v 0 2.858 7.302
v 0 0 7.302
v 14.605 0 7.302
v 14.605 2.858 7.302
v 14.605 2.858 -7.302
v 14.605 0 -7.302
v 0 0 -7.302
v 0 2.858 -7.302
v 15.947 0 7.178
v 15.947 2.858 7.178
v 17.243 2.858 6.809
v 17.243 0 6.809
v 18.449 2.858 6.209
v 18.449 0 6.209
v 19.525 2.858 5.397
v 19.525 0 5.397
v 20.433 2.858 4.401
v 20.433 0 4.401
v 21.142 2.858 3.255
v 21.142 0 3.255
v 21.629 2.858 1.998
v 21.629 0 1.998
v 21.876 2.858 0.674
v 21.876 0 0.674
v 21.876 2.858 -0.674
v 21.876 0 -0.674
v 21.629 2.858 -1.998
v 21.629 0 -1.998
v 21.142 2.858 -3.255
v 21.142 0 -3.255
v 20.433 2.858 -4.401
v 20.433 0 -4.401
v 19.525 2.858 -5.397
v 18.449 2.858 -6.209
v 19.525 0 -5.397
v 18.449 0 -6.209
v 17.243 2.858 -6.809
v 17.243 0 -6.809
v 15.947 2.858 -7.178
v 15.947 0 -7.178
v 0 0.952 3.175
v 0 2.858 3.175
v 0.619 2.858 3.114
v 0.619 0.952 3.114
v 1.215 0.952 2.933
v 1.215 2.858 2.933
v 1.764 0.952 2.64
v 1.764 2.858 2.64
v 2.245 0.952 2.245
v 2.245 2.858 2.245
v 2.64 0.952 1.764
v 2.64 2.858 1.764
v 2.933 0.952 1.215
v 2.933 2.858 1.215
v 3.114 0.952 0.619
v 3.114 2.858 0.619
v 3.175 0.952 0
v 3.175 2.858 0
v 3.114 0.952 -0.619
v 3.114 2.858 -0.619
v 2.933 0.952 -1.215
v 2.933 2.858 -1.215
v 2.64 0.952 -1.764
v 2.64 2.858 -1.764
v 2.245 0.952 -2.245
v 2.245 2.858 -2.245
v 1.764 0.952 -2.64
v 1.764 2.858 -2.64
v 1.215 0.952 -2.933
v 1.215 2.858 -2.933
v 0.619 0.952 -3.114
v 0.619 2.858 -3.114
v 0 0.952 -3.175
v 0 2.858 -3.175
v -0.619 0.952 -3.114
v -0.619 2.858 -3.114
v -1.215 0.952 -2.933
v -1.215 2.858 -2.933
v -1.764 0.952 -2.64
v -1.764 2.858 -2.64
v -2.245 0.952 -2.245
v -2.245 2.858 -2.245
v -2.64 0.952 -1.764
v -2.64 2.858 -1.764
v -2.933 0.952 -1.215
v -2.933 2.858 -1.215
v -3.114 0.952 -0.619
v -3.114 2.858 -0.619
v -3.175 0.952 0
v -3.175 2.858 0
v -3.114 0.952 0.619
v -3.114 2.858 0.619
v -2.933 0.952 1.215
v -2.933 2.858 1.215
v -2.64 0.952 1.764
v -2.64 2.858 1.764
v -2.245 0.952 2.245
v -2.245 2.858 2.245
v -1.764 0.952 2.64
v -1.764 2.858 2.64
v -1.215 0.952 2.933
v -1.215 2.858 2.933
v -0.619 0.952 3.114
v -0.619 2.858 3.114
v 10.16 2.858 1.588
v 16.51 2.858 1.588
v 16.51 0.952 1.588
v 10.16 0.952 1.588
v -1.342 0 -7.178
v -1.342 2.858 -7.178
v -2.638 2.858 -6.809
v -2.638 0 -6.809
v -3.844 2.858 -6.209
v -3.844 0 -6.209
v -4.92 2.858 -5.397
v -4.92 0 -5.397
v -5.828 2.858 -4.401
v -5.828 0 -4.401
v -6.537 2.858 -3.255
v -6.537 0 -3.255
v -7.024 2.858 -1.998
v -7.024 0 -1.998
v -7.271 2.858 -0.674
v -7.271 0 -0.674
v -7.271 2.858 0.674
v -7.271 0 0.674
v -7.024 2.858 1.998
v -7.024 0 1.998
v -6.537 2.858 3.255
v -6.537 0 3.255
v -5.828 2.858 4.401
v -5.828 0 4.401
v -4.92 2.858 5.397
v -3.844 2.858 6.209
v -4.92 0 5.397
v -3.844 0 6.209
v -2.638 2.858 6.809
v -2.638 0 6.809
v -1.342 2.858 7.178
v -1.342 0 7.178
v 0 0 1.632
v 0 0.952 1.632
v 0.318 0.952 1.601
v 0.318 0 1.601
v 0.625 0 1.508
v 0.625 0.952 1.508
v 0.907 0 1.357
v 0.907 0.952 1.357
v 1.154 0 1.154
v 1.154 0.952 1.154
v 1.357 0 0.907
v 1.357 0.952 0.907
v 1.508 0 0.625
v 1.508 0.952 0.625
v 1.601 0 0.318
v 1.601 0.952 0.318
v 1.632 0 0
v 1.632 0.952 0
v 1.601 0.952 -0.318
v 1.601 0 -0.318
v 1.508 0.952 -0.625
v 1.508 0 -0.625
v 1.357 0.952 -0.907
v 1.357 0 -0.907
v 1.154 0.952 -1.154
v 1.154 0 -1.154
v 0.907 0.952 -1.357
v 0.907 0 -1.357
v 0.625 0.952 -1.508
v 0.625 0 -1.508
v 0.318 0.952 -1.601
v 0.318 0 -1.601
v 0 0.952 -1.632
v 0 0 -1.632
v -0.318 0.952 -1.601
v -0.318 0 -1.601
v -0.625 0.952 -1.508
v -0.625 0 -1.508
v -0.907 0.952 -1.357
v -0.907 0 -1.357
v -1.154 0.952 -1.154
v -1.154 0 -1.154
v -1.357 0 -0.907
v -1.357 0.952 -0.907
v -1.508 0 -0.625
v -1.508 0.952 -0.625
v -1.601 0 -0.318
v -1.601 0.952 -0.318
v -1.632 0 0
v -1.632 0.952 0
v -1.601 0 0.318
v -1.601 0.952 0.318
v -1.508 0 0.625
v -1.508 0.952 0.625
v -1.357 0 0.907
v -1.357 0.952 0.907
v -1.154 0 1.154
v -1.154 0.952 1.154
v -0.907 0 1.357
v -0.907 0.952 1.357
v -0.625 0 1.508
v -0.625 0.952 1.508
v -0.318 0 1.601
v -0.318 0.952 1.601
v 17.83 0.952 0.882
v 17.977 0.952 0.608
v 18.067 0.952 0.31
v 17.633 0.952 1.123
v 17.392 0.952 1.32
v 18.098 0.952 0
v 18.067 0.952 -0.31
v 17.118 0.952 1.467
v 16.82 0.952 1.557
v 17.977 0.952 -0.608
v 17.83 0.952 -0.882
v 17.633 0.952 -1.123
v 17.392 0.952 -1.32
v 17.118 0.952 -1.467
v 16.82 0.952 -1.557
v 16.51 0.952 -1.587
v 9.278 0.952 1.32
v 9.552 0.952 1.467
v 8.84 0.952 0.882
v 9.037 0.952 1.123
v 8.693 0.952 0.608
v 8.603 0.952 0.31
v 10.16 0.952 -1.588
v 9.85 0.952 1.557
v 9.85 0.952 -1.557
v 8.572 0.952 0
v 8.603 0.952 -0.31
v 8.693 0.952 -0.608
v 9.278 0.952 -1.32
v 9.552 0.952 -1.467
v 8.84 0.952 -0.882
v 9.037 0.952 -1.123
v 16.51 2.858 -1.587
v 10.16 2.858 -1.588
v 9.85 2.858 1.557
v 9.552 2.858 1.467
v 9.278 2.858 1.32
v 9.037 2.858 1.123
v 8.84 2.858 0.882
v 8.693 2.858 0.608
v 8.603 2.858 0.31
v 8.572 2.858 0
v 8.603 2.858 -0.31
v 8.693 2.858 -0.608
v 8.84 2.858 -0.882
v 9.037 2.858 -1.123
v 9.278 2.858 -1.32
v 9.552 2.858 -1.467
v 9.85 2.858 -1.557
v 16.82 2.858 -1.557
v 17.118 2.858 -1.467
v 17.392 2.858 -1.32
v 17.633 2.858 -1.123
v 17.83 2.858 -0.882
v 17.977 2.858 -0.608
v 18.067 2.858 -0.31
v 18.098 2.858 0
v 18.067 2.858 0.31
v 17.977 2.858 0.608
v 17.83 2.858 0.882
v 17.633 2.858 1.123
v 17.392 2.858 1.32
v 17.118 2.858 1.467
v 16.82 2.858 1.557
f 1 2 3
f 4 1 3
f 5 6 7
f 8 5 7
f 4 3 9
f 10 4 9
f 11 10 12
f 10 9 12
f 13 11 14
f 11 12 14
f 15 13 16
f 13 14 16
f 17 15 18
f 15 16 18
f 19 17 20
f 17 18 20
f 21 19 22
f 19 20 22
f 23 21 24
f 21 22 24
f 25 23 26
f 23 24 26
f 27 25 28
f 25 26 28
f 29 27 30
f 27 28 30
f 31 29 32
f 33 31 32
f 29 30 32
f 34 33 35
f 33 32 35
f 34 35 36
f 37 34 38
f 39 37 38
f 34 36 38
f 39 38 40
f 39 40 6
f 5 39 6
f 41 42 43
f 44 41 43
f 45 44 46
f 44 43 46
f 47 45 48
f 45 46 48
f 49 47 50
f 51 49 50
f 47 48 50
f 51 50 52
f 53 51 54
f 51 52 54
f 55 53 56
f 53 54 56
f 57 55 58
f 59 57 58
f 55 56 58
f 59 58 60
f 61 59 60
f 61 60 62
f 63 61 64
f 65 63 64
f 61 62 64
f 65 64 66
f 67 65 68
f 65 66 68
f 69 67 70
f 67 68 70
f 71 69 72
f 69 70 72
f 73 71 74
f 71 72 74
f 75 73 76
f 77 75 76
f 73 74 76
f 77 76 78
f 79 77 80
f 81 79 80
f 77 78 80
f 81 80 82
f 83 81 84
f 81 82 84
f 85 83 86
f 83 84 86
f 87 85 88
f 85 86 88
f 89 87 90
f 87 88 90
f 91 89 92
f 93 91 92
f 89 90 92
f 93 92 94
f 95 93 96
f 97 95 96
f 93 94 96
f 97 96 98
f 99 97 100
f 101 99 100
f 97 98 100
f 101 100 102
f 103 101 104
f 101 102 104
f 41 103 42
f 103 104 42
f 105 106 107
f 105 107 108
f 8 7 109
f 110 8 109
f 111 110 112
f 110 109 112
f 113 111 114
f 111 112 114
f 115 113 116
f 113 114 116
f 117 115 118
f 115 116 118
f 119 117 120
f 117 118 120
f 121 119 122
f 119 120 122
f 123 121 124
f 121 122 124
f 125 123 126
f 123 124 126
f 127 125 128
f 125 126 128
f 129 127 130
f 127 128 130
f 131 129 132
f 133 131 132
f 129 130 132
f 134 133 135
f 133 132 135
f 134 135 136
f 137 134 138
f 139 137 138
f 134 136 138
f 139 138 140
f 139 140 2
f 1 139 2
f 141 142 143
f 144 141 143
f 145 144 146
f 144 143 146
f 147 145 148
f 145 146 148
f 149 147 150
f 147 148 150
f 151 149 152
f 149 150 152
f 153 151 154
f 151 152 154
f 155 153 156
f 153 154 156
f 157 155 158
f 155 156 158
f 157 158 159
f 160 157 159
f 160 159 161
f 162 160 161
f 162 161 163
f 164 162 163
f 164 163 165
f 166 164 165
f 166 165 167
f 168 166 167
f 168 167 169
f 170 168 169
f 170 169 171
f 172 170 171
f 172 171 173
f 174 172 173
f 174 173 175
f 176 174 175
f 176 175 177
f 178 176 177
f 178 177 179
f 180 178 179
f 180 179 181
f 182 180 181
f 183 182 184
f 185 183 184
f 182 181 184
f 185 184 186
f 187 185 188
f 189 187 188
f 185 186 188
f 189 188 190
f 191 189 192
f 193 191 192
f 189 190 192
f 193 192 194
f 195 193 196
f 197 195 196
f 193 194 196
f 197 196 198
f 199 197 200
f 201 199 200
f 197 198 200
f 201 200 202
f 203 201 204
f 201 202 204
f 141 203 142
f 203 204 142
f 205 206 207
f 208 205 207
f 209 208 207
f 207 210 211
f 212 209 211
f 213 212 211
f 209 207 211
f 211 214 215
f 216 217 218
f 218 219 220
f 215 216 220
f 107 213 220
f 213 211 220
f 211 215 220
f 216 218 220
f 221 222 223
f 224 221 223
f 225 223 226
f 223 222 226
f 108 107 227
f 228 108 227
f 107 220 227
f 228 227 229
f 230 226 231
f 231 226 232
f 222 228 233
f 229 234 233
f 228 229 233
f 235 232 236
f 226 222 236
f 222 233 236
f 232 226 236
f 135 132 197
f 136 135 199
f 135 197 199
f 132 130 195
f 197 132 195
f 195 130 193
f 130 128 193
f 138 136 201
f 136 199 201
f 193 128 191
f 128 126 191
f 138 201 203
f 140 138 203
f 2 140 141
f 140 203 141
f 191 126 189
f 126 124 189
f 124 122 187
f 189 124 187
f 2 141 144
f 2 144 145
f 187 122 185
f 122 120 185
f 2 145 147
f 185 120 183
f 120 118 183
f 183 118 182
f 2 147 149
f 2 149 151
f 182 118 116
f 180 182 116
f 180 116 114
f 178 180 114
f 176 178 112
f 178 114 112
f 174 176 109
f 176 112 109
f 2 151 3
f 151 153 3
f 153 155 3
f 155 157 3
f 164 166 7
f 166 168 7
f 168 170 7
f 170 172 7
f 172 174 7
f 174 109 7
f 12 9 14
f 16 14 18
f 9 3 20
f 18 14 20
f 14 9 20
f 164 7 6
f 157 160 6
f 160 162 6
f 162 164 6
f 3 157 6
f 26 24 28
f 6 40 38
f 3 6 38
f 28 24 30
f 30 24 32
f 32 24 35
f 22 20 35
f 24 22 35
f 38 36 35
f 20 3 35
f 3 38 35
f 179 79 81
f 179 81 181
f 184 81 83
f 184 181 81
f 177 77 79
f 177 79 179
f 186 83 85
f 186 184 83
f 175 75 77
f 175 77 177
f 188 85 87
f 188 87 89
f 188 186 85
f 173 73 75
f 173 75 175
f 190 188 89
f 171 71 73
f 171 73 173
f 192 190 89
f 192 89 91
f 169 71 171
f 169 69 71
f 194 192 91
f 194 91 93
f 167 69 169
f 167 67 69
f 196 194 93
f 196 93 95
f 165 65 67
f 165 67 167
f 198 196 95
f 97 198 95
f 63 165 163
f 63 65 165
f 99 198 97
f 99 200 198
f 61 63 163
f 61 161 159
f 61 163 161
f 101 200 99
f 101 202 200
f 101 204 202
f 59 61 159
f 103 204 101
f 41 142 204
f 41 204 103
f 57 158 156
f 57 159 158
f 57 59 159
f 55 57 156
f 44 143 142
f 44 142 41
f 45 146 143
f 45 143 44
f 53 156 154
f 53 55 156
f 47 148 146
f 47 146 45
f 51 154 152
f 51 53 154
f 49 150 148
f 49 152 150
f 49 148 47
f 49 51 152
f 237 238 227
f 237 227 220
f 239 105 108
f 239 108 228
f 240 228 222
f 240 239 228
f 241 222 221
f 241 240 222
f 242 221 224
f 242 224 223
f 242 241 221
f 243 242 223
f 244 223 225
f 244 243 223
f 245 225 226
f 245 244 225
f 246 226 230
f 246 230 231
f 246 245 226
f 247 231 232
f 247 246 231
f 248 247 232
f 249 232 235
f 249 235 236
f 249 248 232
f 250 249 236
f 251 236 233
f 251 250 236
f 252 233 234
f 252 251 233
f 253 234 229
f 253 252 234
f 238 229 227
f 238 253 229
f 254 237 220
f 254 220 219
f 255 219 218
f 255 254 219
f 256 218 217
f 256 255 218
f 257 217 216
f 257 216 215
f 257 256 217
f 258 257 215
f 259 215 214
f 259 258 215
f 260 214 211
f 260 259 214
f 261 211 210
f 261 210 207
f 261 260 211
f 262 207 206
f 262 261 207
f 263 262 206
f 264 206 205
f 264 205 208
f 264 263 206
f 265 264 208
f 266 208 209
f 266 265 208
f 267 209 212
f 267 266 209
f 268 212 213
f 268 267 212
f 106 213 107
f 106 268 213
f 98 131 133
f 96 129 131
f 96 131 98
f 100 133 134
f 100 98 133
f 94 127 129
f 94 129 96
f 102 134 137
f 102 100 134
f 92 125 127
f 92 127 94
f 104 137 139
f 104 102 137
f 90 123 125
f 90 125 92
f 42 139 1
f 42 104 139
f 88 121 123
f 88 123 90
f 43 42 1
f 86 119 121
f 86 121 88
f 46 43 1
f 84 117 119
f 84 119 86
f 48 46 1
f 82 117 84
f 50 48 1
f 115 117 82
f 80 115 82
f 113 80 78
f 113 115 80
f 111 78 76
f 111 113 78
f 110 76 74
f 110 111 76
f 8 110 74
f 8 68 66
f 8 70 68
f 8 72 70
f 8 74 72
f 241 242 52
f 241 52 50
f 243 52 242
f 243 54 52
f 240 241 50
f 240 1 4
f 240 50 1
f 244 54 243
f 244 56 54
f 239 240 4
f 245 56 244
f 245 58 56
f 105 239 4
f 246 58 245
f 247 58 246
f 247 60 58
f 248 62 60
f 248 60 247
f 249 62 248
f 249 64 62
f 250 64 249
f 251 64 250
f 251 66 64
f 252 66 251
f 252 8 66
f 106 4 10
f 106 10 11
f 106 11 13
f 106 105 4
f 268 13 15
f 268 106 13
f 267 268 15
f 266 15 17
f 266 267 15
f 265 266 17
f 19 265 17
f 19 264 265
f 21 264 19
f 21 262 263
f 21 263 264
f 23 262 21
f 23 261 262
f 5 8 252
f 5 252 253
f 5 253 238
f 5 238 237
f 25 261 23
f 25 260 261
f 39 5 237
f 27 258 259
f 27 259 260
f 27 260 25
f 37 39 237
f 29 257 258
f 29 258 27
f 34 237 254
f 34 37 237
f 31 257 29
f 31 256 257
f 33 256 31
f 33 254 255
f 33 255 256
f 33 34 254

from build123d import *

# Parameters (mm, degrees)
BOSS_EXTRUDE1_DEPTH = 2.8575
SKETCH2_R           = 1.63195
CUT_EXTRUDE1_DEPTH  = 3.048
SKETCH3_R           = 3.175
CUT_EXTRUDE2_DEPTH  = 1.905


with BuildPart() as part:
    # Sketch1 → Boss-Extrude1 (new body)
    with BuildSketch(Plane(origin=(0, 0, 0), x_dir=(1, 0, 0), z_dir=(0, 1, 0))):
        with BuildLine():
            Line((14.605, 7.3025), (0, 7.3025))
            ThreePointArc((0, 7.3025), (-7.3025, 0), (0, -7.3025))
            Line((0, -7.3025), (14.605, -7.3025))
            ThreePointArc((14.605, -7.3025), (21.9075, 0), (14.605, 7.3025))
        make_face()
    extrude(amount=BOSS_EXTRUDE1_DEPTH)

    # Sketch2 → Cut-Extrude1 (cut)
    with BuildSketch(Plane(origin=(0, 2.8575, 0), x_dir=(1, 0, 0), z_dir=(0, 1, 0))):
        with Locations(Location((0, 0, 0), (0, 0, 270))):
            Circle(SKETCH2_R)
    extrude(amount=-CUT_EXTRUDE1_DEPTH, mode=Mode.SUBTRACT)

    # Sketch3 → Cut-Extrude2 (cut)
    with BuildSketch(Plane(origin=(0, 2.8575, 0), x_dir=(1, 0, 0), z_dir=(0, 1, 0))):
        with Locations(Location((0, 0, 0), (0, 0, 270))):
            Circle(SKETCH3_R)
        with BuildLine():
            Line((10.16, 1.5875), (16.51, 1.5875))
            ThreePointArc((16.51, 1.5875), (18.0975, 0), (16.51, -1.5875))
            Line((16.51, -1.5875), (10.16, -1.5875))
            ThreePointArc((10.16, -1.5875), (8.5725, 0), (10.16, 1.5875))
        make_face()
    extrude(amount=-CUT_EXTRUDE2_DEPTH, mode=Mode.SUBTRACT)


solid = part.part
